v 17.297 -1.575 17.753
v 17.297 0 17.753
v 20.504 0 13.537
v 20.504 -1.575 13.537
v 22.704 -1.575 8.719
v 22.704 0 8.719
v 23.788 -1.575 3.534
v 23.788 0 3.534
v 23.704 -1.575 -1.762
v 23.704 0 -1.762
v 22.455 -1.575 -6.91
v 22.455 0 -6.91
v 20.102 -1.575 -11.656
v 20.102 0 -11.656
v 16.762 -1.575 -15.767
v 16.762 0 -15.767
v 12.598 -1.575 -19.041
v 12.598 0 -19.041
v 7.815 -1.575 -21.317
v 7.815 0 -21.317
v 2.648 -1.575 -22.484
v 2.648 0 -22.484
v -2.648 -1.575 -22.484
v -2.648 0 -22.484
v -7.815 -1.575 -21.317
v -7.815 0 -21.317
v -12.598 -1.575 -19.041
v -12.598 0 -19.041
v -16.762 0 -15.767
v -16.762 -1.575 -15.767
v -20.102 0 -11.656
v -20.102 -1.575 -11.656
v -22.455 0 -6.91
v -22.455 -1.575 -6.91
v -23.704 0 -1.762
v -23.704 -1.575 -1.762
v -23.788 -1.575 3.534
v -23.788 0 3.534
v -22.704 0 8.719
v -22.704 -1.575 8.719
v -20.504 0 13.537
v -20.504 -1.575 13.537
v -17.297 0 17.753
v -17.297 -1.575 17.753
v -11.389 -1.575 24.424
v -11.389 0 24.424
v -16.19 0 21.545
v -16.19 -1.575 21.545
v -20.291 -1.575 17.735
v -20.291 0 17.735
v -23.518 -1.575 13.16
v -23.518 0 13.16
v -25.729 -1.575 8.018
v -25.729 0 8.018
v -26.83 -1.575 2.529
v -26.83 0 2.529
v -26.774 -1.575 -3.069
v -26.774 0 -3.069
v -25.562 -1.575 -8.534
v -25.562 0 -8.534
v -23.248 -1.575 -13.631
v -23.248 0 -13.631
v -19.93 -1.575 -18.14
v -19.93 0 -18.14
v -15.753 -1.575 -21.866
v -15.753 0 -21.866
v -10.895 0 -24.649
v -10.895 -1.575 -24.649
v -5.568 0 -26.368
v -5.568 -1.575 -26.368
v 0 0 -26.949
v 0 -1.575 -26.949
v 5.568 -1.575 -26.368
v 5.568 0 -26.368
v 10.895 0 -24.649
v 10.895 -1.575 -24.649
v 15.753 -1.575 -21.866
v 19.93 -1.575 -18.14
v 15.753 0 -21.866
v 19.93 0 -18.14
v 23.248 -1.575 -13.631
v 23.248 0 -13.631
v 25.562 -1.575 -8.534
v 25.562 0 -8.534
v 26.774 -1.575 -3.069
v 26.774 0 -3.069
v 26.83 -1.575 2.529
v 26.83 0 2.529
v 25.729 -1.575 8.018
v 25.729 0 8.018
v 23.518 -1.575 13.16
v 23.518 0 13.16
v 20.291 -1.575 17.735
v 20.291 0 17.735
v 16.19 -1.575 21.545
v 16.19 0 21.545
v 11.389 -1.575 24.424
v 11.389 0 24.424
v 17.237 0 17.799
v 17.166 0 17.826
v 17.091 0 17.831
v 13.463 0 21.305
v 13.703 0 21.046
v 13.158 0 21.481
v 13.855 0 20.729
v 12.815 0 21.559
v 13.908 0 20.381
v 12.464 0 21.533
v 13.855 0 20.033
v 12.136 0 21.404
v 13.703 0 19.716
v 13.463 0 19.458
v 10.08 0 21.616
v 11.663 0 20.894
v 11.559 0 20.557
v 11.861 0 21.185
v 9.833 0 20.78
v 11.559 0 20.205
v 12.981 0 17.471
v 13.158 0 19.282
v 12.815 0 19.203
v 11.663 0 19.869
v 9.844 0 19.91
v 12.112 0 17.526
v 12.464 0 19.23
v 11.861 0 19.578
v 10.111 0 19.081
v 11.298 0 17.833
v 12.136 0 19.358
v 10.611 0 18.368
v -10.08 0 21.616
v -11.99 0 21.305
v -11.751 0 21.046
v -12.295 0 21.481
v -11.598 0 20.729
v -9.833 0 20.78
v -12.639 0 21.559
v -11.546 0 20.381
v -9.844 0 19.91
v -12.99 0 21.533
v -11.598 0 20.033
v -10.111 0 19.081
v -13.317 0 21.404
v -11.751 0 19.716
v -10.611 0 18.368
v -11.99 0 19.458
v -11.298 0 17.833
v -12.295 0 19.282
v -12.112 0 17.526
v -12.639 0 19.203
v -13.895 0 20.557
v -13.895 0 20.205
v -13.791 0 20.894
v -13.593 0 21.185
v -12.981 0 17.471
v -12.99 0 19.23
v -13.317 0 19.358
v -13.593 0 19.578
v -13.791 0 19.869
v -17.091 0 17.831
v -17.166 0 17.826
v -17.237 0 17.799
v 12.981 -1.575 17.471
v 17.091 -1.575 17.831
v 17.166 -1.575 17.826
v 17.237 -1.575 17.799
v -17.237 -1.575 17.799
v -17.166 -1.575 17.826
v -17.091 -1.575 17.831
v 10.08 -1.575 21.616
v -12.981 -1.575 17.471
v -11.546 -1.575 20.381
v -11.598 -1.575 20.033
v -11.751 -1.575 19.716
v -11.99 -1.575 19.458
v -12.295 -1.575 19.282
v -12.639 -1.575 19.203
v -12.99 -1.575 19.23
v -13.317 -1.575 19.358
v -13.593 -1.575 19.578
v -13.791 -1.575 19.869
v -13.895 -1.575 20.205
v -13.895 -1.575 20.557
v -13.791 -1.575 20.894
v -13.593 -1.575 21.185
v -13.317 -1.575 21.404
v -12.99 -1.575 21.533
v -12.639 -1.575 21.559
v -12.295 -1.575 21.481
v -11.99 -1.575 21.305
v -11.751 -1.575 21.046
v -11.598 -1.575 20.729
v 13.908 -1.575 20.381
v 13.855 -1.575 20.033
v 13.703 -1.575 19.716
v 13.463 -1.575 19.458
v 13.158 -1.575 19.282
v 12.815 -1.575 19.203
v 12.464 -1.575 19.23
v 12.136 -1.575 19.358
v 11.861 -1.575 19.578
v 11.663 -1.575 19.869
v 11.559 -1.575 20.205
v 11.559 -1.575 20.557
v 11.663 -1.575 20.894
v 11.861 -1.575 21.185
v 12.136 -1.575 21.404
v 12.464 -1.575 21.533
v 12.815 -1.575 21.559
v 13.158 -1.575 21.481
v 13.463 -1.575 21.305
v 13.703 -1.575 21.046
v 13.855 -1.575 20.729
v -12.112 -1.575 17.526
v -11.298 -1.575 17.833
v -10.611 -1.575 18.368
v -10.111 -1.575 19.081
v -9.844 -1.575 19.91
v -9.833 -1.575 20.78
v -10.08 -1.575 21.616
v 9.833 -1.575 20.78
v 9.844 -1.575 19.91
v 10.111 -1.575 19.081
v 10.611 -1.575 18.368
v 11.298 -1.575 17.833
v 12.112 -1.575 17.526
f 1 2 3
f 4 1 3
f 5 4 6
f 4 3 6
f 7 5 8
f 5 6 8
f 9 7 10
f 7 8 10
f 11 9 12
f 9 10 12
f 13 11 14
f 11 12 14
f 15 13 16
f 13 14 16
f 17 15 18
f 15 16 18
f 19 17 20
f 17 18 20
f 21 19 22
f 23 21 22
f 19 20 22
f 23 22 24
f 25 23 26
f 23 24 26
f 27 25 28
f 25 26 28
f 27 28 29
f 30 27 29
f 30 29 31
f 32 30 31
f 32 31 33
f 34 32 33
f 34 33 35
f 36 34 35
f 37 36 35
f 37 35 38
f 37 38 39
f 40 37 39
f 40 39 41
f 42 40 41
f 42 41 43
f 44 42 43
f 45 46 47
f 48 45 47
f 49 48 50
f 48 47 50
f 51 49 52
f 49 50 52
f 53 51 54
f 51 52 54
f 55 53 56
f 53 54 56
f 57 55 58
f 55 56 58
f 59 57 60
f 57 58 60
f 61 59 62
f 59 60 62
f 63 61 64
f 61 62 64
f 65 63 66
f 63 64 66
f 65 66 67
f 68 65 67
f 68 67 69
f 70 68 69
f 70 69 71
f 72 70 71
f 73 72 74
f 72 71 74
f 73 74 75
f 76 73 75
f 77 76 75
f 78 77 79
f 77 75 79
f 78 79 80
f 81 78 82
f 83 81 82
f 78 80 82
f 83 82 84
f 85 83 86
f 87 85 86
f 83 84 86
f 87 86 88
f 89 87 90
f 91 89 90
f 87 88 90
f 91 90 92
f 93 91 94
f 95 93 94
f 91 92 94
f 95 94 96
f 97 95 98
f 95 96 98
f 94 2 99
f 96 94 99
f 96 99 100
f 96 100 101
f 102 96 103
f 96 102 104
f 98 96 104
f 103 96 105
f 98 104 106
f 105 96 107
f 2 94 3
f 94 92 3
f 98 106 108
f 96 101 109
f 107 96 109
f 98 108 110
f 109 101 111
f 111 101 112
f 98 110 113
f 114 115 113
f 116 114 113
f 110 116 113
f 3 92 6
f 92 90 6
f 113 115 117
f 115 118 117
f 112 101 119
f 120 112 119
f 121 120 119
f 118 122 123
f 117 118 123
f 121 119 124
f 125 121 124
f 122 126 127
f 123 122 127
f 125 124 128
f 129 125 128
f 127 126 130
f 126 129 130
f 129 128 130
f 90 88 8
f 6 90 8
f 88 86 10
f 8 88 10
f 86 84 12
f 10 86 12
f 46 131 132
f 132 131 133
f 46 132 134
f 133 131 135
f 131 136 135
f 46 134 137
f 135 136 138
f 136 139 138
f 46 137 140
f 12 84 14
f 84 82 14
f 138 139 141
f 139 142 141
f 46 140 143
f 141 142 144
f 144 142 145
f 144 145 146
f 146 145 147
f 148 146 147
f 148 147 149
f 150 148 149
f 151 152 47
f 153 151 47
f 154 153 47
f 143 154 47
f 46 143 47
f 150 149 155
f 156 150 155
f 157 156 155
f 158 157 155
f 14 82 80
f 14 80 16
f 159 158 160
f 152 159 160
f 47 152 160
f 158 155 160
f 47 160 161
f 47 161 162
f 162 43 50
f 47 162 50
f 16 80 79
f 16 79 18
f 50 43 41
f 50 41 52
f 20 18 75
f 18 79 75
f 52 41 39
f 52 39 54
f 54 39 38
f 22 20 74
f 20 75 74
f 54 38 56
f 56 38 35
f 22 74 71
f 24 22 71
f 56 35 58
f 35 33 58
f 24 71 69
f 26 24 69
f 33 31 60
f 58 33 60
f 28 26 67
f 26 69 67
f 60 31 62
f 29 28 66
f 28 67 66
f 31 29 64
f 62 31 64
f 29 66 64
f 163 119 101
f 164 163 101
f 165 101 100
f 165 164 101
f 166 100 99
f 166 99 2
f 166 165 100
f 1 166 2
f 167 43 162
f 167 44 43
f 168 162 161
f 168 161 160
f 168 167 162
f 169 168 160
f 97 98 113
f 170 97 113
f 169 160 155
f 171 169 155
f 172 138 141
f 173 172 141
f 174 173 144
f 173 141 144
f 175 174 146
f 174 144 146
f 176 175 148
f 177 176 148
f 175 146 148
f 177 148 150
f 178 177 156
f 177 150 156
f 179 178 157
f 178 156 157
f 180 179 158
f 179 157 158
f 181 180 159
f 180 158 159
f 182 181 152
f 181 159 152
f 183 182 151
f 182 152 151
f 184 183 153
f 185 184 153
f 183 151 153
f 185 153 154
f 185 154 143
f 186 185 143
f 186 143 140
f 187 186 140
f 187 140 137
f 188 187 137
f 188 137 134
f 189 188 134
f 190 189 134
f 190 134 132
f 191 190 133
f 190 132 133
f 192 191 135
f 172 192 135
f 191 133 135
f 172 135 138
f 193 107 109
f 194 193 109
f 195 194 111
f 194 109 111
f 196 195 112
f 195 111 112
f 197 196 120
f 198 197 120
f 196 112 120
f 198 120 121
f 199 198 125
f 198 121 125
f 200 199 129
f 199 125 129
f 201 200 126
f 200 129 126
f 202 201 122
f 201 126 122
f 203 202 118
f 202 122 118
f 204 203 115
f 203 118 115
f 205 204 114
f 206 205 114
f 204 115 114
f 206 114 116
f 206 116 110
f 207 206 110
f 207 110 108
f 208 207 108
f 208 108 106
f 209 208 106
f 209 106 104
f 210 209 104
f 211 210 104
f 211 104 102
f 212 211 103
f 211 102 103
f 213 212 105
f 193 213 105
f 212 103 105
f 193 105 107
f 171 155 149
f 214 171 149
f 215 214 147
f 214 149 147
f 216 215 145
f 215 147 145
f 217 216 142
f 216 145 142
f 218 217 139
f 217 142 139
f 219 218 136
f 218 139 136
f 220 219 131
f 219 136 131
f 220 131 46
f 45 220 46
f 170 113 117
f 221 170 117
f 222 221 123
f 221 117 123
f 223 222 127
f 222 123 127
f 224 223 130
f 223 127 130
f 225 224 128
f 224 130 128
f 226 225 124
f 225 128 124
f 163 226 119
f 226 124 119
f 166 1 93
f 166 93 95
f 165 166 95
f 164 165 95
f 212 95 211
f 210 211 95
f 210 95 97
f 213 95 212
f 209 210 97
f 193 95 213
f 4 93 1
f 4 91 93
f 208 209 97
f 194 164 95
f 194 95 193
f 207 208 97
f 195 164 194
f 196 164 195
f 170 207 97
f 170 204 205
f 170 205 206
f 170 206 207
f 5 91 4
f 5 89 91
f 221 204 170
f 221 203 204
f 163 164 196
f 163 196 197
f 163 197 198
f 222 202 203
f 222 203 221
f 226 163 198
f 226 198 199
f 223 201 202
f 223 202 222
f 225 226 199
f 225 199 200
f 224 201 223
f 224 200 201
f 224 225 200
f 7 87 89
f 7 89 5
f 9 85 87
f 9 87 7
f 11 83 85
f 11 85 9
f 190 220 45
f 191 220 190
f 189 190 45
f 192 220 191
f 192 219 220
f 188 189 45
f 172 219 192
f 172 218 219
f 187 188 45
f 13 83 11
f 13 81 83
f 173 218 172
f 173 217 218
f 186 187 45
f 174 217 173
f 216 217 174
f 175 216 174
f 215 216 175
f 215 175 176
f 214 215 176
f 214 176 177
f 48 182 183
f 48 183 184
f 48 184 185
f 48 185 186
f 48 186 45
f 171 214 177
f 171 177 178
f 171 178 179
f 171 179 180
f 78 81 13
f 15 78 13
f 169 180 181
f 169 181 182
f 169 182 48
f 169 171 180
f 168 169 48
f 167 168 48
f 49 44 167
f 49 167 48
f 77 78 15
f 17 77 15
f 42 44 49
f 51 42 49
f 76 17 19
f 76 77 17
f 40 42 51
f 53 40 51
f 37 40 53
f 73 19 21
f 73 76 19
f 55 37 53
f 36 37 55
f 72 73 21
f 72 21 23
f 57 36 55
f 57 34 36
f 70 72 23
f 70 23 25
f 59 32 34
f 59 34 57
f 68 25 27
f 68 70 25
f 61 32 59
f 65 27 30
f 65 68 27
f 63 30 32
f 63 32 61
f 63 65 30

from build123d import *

# Parameters (mm, degrees)
SKETCH2_R      = 1.1811
EXTRUDE1_DEPTH = 1.5748
FILLET1_R      = 0.254


with BuildPart() as part:
    # Sketch2 → Extrude1 (new body)
    with BuildSketch(Plane(origin=(0, 0, 0), x_dir=(1, 0, 0), z_dir=(0, 1, 0))):
        with BuildLine():
            Line((11.389308583, -24.424451076), (10.079527634, -21.615616767))
            ThreePointArc((10.079527634, -21.615616767), (10.334109559, -18.705732054), (12.981434605, -17.471264112))
            Line((12.981434605, -17.471264112), (17.211887304, -17.841380764))
            ThreePointArc((17.211887304, -17.841380764), (0, 22.6314), (-17.211887304, -17.841380764))
            Line((-17.211887304, -17.841380764), (-12.981434605, -17.471264112))
            ThreePointArc((-12.981434605, -17.471264112), (-10.334109559, -18.705732054), (-10.079527634, -21.615616767))
            Line((-10.079527634, -21.615616767), (-11.389308583, -24.424451076))
            ThreePointArc((-11.389308583, -24.424451076), (0, 26.9494), (11.389308583, -24.424451076))
        make_face()
        with Locations((12.72685268, -20.381148825)):
            Circle(SKETCH2_R, mode=Mode.SUBTRACT)
        with Locations((-12.72685268, -20.381148825)):
            Circle(SKETCH2_R, mode=Mode.SUBTRACT)
    extrude(amount=-EXTRUDE1_DEPTH)

    # Fillet1
    fillet1_edges = [part.edges().sort_by_distance(p)[0] for p in [
        (17.211887304, -0.7874, 17.841380764),
        (-17.211887304, -0.7874, 17.841380764),
    ]]
    fillet(fillet1_edges, radius=FILLET1_R)


solid = part.part
